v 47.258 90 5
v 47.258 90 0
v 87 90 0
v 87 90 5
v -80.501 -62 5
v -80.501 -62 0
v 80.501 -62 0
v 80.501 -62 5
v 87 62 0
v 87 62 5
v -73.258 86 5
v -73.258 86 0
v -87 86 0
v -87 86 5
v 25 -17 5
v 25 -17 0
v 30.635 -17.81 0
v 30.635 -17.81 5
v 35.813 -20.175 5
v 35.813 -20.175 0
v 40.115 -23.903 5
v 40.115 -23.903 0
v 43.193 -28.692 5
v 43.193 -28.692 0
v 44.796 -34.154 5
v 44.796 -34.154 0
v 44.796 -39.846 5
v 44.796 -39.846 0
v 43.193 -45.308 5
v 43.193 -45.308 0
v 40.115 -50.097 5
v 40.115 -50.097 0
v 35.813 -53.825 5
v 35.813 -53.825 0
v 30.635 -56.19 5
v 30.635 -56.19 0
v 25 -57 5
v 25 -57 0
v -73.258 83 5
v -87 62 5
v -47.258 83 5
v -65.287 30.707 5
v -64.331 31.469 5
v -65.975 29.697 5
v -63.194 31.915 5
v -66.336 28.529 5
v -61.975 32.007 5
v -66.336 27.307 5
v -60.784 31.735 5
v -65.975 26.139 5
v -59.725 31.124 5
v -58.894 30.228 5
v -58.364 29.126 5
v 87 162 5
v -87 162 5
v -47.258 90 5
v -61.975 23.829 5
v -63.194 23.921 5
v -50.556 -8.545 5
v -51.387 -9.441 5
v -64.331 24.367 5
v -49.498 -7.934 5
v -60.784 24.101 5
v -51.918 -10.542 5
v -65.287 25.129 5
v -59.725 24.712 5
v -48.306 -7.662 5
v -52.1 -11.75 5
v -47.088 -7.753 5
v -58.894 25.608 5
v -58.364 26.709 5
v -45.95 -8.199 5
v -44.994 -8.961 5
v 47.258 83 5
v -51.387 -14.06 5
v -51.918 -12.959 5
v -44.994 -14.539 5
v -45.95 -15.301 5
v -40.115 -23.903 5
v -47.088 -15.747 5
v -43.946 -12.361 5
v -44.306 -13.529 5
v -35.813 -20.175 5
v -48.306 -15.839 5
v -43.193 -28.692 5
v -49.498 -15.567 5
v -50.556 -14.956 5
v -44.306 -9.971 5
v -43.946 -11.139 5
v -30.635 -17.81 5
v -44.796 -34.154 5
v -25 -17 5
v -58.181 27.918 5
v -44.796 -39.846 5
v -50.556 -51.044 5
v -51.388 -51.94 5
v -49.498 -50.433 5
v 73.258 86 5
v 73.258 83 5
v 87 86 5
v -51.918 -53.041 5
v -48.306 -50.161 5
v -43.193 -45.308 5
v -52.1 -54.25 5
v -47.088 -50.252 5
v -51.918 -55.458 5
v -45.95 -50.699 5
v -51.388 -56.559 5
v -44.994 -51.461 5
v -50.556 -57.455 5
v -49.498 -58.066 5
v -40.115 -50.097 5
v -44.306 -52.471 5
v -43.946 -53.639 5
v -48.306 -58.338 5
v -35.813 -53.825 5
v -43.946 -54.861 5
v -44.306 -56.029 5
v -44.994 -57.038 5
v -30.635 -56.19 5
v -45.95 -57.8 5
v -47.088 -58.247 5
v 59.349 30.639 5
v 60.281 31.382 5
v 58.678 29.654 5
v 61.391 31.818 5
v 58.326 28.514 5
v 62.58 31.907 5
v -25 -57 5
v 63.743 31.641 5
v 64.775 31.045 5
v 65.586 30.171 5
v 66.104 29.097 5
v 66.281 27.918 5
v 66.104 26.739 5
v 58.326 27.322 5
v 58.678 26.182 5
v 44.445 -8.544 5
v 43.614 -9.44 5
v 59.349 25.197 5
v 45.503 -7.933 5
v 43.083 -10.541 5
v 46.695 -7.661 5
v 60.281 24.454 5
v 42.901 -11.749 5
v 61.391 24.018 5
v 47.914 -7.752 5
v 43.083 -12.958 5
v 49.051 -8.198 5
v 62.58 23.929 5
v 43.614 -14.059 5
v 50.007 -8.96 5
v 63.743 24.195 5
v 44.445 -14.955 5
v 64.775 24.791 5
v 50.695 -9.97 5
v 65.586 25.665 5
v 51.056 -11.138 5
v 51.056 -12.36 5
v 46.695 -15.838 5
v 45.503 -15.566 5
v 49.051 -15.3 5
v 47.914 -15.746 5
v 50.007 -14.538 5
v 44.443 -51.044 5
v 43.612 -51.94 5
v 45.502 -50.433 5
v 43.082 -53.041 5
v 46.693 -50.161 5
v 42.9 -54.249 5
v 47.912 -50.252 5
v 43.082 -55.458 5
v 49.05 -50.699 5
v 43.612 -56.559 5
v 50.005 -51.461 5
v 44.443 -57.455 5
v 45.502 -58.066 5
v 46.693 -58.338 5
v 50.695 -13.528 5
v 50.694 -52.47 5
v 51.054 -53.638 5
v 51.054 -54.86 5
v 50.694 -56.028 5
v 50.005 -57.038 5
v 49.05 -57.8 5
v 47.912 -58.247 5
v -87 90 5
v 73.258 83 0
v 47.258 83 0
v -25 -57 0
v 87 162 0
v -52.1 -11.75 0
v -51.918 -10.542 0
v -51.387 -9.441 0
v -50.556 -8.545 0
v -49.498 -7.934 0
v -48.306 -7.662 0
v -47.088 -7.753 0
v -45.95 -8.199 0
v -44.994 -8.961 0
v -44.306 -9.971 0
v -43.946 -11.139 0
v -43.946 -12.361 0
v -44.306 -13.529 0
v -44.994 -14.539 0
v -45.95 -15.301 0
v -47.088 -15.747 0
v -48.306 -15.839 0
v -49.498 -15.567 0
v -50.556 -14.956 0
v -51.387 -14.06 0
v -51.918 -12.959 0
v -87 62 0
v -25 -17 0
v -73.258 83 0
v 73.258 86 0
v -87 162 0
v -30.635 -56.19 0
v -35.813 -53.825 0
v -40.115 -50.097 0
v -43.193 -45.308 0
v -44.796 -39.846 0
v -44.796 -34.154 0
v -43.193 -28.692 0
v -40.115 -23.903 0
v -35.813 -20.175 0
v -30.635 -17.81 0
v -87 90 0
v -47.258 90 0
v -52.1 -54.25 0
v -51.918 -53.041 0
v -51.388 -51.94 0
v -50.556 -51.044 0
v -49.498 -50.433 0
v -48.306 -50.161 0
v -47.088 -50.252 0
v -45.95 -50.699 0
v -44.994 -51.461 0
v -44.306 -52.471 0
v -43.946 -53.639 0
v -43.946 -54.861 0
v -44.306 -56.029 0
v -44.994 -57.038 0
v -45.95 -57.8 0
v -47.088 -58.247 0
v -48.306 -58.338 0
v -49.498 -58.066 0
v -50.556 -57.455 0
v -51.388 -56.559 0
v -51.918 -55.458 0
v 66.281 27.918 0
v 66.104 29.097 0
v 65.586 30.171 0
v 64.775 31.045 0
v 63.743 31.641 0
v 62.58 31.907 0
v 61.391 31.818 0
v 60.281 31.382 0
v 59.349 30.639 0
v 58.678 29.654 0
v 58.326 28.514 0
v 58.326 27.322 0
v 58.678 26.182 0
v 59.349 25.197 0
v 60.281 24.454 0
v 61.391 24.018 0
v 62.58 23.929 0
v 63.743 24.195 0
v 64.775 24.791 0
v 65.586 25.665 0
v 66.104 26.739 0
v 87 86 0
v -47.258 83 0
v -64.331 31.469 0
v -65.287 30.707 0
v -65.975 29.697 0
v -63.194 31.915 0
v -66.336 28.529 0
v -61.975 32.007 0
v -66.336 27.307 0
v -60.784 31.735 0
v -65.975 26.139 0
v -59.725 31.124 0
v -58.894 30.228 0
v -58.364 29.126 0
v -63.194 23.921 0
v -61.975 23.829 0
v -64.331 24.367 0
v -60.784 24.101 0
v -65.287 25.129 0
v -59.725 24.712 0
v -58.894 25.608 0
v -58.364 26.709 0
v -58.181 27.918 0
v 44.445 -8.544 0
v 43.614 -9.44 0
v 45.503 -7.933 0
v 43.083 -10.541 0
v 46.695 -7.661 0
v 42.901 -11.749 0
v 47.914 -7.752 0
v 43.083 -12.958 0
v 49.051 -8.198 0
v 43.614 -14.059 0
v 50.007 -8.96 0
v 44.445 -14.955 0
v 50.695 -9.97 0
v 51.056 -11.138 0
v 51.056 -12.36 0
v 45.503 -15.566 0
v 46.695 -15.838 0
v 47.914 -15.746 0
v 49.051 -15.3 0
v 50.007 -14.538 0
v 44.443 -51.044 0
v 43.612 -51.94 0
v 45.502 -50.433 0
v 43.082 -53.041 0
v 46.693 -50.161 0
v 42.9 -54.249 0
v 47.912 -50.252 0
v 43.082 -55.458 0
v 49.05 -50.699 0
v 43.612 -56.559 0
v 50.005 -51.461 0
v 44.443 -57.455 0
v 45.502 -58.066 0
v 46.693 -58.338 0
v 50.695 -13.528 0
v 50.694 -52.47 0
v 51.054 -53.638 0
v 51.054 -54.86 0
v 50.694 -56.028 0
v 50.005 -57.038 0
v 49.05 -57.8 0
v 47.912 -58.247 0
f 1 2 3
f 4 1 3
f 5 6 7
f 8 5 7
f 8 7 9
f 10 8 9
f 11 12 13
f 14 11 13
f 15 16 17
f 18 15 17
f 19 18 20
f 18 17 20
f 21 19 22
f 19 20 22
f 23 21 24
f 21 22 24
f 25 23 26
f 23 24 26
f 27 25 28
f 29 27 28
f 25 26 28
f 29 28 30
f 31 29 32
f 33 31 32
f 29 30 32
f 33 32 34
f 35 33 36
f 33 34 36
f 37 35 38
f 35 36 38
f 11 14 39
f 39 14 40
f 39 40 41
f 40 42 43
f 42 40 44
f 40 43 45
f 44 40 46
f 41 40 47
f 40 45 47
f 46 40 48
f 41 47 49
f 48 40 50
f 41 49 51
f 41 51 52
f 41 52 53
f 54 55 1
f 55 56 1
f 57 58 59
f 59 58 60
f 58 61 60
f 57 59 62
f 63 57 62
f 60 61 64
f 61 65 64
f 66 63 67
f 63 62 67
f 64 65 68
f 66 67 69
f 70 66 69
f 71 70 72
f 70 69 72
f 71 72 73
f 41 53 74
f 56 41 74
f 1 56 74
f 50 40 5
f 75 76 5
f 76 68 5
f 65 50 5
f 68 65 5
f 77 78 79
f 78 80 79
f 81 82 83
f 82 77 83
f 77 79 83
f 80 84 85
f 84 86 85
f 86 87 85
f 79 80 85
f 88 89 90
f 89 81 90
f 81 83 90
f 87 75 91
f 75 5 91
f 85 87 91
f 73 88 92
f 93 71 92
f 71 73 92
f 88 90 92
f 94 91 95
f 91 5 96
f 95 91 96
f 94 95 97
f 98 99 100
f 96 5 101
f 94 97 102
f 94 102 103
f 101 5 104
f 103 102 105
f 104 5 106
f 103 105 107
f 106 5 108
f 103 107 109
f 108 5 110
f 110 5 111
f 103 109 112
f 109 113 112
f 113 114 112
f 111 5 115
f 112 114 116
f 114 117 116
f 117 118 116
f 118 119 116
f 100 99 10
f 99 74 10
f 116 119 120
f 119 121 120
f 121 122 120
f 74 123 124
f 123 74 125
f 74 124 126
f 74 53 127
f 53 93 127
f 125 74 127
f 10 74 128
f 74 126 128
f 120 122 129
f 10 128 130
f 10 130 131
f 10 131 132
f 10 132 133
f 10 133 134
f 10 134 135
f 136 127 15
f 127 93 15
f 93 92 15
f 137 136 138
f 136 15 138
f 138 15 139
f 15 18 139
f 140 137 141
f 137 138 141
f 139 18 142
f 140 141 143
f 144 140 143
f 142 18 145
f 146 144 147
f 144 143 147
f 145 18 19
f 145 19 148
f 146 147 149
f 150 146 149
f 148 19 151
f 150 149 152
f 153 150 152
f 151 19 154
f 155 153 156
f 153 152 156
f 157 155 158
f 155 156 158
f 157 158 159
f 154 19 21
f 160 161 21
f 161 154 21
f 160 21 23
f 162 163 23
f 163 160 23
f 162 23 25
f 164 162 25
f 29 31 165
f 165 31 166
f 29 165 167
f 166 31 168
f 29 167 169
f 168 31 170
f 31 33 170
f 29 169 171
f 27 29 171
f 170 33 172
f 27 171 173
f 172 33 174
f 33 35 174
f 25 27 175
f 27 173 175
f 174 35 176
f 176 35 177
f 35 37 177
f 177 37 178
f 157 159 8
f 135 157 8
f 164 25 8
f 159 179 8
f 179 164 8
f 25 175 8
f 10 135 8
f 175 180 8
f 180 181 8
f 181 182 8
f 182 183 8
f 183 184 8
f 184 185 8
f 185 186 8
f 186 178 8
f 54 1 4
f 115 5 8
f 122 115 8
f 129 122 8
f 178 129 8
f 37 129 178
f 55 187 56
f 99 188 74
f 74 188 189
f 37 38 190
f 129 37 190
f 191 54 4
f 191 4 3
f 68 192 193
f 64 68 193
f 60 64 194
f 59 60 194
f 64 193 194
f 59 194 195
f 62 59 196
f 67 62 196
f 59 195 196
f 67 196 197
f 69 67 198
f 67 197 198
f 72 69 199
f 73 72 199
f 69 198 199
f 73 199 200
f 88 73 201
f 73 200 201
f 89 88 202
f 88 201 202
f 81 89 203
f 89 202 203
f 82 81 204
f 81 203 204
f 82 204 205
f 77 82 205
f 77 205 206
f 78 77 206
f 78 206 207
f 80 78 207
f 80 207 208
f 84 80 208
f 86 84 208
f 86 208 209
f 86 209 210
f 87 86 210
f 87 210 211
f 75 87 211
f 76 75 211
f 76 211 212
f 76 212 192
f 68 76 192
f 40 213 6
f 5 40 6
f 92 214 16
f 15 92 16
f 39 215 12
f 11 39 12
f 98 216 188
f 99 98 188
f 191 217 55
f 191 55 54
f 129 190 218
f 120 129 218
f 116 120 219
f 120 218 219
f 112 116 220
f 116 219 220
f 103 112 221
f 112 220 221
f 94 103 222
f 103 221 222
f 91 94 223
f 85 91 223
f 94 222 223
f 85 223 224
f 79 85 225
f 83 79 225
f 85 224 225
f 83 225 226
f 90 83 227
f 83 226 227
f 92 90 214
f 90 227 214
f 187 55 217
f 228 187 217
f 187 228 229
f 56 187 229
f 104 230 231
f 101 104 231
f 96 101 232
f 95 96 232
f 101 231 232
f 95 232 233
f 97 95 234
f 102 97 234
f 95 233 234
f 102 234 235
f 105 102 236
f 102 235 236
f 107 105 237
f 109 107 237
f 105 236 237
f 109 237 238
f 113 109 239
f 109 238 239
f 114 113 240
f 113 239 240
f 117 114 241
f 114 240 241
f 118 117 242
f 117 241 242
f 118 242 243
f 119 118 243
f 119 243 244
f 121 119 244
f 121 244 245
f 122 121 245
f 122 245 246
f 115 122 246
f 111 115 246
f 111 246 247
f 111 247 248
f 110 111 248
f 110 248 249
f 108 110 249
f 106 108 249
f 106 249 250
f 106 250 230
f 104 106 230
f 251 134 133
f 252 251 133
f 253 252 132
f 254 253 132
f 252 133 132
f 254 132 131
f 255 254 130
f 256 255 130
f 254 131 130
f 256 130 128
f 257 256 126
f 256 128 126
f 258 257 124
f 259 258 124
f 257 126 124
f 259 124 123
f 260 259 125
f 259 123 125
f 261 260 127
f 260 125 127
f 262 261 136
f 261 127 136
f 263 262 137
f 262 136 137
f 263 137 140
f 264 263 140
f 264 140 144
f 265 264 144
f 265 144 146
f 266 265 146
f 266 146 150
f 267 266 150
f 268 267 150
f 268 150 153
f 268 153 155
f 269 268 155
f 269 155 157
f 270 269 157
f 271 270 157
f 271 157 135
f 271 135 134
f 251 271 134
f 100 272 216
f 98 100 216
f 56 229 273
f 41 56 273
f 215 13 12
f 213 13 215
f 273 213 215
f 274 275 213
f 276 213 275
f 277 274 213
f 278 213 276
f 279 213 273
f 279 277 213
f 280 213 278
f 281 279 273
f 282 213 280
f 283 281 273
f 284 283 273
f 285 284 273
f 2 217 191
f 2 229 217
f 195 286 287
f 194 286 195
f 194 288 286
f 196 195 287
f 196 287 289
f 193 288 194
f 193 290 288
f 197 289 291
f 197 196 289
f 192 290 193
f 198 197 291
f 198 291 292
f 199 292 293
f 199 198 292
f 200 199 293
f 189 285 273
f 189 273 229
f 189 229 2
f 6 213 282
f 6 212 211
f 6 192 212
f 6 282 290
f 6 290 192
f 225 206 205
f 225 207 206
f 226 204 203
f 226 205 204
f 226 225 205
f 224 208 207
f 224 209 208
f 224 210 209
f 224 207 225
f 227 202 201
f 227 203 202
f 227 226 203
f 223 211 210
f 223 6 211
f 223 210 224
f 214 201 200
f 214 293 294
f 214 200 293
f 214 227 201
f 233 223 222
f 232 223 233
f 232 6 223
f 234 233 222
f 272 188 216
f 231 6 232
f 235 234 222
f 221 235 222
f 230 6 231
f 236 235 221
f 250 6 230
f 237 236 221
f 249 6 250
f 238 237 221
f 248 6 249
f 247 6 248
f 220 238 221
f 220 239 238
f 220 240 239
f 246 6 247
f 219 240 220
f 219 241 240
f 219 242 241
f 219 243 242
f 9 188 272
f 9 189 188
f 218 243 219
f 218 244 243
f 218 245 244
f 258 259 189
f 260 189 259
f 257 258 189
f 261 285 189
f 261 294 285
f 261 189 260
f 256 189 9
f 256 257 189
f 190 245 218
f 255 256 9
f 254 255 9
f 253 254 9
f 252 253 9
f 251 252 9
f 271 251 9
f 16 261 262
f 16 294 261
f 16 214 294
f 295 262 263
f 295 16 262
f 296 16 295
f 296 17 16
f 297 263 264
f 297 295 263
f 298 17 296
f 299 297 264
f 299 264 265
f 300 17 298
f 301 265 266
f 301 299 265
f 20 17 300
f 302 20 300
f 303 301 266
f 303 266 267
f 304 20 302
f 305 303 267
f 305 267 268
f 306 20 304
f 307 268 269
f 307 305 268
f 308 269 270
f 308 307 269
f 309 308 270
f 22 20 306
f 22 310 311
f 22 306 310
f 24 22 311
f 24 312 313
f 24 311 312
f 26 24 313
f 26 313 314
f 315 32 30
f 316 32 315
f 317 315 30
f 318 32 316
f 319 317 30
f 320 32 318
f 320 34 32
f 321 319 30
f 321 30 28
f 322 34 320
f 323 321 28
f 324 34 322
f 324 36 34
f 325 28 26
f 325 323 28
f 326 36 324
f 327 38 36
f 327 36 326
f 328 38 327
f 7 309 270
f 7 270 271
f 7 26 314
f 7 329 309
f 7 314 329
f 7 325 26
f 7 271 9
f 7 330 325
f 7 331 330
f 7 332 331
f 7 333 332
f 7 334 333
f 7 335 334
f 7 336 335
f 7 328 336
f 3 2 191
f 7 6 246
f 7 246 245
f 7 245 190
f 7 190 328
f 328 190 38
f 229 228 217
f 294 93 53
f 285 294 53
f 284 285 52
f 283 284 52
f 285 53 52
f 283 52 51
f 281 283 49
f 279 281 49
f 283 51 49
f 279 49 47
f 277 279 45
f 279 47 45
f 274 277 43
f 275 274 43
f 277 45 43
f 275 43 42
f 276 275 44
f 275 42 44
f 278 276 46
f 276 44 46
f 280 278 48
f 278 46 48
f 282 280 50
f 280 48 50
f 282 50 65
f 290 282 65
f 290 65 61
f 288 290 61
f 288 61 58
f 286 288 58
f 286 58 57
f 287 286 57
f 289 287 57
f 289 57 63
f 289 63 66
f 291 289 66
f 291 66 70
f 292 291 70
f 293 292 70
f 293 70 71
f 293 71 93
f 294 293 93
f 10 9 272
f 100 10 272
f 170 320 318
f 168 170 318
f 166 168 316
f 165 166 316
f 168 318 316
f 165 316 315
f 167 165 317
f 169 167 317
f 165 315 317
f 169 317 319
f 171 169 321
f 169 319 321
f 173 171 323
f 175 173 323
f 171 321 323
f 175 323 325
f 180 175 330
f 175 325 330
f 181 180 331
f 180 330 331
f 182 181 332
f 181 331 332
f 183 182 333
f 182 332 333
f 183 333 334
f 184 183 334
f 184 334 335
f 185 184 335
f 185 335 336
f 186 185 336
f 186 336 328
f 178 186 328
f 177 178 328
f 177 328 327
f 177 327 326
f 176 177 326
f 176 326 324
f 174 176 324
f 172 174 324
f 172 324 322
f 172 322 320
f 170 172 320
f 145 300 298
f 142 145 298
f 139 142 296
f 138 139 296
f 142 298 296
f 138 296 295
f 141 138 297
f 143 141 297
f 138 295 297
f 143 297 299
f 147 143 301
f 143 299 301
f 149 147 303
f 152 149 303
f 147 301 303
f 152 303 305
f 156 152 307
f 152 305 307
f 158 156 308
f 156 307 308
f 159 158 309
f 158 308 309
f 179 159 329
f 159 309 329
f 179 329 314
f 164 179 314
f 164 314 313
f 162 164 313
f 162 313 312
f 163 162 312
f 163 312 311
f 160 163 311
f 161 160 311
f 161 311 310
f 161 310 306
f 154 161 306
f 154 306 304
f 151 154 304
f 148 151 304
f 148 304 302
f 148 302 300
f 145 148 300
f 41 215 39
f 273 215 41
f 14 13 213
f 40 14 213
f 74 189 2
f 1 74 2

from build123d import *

# Parameters (mm, degrees)
BOSS_EXTRUDE1_DEPTH     = 5
CHAMFER1_SIZE           = 2
BOSS_EXTRUDE4_START     = 80
BOSS_EXTRUDE4_OUTLINE_W = 26
BOSS_EXTRUDE4_OUTLINE_H = 5
BOSS_EXTRUDE4_DEPTH     = 3
SKETCH2_R               = 4.1
SKETCH2_R_2             = 4
CUT_EXTRUDE2_DEPTH      = 36.925038653
SKETCH4_R               = 4.1
CUT_EXTRUDE3_DEPTH      = 9.191294825
SKETCH5_W               = 174
SKETCH5_H               = 5
BOSS_EXTRUDE5_DEPTH     = 50


with BuildPart() as part:
    # Boss-Extrude1: read off the stored shape, not the designer's step
    # Boss-Extrude1 outline → Boss-Extrude1 (new body)
    with BuildSketch(Plane.XY):
        Polygon((-87, 62), (-80.501435369, -62), (80.501435369, -62), (87, 62), (87, 86), (73.257786703, 86), (73.257786703, 83), (47.257786703, 83), (47.257786703, 90), (87, 90), (87, 112), (-87, 112), (-87, 90), (-47.257786703, 90), (-47.257786703, 83), (-73.257786703, 83), (-73.257786703, 86), (-87, 86), align=None)
        with BuildLine():
            Line((-25, -17), (25, -17))
            ThreePointArc((25, -17), (45, -37), (25, -57))
            Line((25, -57), (-25, -57))
            ThreePointArc((-25, -57), (-45, -37), (-25, -17))
        make_face(mode=Mode.SUBTRACT)
    extrude(amount=BOSS_EXTRUDE1_DEPTH)

    # Chamfer1
    chamfer1_edges = [part.edges().sort_by_distance(p)[0] for p in [
        (60.257786703, 83, 5),
        (-60.257786703, 83, 5),
    ]]
    chamfer(chamfer1_edges, length=CHAMFER1_SIZE)

    # Boss-Extrude4: read off the stored shape, not the designer's step
    # Boss-Extrude4 outline → Boss-Extrude4 (add)
    with BuildSketch(Plane(origin=(0, 0, 0), x_dir=(1, 0, 0), z_dir=(0, 1, 0)).offset(BOSS_EXTRUDE4_START)):
        with Locations((60.257786703, -2.5)):
            Rectangle(BOSS_EXTRUDE4_OUTLINE_W, BOSS_EXTRUDE4_OUTLINE_H)
        with Locations((-60.257786703, -2.5)):
            Rectangle(BOSS_EXTRUDE4_OUTLINE_W, BOSS_EXTRUDE4_OUTLINE_H)
    extrude(amount=BOSS_EXTRUDE4_DEPTH)

    # Sketch2 → Cut-Extrude2 (cut)
    with BuildSketch(Plane.XY.offset(5)):
        with Locations((-62.28149578, 27.917996168)):
            Circle(SKETCH2_R)
        with Locations((62.28149578, 27.917996168)):
            Circle(SKETCH2_R_2)
    extrude(amount=-CUT_EXTRUDE2_DEPTH, mode=Mode.SUBTRACT)

    # Sketch4 → Cut-Extrude3 (cut)
    with BuildSketch(Plane(origin=(0, 0, 0), x_dir=(-1, 0, 0), z_dir=(0, 0, -1))):
        with Locations((-47.001300636, -11.749189401)):
            Circle(SKETCH4_R)
        with Locations((47.999909157, -11.750133675)):
            Circle(SKETCH4_R)
        with Locations((47.999996185, -54.249608673)):
            Circle(SKETCH4_R)
        with Locations((-46.999683563, -54.249320844)):
            Circle(SKETCH4_R)
    extrude(amount=-CUT_EXTRUDE3_DEPTH, mode=Mode.SUBTRACT)

    # Sketch5 → Boss-Extrude5 (add)
    with BuildSketch(Plane(origin=(0, 112, 0), x_dir=(1, 0, 0), z_dir=(0, 1, 0))):
        with Locations((0, -2.5)):
            Rectangle(SKETCH5_W, SKETCH5_H)
    extrude(amount=BOSS_EXTRUDE5_DEPTH)


solid = part.part
